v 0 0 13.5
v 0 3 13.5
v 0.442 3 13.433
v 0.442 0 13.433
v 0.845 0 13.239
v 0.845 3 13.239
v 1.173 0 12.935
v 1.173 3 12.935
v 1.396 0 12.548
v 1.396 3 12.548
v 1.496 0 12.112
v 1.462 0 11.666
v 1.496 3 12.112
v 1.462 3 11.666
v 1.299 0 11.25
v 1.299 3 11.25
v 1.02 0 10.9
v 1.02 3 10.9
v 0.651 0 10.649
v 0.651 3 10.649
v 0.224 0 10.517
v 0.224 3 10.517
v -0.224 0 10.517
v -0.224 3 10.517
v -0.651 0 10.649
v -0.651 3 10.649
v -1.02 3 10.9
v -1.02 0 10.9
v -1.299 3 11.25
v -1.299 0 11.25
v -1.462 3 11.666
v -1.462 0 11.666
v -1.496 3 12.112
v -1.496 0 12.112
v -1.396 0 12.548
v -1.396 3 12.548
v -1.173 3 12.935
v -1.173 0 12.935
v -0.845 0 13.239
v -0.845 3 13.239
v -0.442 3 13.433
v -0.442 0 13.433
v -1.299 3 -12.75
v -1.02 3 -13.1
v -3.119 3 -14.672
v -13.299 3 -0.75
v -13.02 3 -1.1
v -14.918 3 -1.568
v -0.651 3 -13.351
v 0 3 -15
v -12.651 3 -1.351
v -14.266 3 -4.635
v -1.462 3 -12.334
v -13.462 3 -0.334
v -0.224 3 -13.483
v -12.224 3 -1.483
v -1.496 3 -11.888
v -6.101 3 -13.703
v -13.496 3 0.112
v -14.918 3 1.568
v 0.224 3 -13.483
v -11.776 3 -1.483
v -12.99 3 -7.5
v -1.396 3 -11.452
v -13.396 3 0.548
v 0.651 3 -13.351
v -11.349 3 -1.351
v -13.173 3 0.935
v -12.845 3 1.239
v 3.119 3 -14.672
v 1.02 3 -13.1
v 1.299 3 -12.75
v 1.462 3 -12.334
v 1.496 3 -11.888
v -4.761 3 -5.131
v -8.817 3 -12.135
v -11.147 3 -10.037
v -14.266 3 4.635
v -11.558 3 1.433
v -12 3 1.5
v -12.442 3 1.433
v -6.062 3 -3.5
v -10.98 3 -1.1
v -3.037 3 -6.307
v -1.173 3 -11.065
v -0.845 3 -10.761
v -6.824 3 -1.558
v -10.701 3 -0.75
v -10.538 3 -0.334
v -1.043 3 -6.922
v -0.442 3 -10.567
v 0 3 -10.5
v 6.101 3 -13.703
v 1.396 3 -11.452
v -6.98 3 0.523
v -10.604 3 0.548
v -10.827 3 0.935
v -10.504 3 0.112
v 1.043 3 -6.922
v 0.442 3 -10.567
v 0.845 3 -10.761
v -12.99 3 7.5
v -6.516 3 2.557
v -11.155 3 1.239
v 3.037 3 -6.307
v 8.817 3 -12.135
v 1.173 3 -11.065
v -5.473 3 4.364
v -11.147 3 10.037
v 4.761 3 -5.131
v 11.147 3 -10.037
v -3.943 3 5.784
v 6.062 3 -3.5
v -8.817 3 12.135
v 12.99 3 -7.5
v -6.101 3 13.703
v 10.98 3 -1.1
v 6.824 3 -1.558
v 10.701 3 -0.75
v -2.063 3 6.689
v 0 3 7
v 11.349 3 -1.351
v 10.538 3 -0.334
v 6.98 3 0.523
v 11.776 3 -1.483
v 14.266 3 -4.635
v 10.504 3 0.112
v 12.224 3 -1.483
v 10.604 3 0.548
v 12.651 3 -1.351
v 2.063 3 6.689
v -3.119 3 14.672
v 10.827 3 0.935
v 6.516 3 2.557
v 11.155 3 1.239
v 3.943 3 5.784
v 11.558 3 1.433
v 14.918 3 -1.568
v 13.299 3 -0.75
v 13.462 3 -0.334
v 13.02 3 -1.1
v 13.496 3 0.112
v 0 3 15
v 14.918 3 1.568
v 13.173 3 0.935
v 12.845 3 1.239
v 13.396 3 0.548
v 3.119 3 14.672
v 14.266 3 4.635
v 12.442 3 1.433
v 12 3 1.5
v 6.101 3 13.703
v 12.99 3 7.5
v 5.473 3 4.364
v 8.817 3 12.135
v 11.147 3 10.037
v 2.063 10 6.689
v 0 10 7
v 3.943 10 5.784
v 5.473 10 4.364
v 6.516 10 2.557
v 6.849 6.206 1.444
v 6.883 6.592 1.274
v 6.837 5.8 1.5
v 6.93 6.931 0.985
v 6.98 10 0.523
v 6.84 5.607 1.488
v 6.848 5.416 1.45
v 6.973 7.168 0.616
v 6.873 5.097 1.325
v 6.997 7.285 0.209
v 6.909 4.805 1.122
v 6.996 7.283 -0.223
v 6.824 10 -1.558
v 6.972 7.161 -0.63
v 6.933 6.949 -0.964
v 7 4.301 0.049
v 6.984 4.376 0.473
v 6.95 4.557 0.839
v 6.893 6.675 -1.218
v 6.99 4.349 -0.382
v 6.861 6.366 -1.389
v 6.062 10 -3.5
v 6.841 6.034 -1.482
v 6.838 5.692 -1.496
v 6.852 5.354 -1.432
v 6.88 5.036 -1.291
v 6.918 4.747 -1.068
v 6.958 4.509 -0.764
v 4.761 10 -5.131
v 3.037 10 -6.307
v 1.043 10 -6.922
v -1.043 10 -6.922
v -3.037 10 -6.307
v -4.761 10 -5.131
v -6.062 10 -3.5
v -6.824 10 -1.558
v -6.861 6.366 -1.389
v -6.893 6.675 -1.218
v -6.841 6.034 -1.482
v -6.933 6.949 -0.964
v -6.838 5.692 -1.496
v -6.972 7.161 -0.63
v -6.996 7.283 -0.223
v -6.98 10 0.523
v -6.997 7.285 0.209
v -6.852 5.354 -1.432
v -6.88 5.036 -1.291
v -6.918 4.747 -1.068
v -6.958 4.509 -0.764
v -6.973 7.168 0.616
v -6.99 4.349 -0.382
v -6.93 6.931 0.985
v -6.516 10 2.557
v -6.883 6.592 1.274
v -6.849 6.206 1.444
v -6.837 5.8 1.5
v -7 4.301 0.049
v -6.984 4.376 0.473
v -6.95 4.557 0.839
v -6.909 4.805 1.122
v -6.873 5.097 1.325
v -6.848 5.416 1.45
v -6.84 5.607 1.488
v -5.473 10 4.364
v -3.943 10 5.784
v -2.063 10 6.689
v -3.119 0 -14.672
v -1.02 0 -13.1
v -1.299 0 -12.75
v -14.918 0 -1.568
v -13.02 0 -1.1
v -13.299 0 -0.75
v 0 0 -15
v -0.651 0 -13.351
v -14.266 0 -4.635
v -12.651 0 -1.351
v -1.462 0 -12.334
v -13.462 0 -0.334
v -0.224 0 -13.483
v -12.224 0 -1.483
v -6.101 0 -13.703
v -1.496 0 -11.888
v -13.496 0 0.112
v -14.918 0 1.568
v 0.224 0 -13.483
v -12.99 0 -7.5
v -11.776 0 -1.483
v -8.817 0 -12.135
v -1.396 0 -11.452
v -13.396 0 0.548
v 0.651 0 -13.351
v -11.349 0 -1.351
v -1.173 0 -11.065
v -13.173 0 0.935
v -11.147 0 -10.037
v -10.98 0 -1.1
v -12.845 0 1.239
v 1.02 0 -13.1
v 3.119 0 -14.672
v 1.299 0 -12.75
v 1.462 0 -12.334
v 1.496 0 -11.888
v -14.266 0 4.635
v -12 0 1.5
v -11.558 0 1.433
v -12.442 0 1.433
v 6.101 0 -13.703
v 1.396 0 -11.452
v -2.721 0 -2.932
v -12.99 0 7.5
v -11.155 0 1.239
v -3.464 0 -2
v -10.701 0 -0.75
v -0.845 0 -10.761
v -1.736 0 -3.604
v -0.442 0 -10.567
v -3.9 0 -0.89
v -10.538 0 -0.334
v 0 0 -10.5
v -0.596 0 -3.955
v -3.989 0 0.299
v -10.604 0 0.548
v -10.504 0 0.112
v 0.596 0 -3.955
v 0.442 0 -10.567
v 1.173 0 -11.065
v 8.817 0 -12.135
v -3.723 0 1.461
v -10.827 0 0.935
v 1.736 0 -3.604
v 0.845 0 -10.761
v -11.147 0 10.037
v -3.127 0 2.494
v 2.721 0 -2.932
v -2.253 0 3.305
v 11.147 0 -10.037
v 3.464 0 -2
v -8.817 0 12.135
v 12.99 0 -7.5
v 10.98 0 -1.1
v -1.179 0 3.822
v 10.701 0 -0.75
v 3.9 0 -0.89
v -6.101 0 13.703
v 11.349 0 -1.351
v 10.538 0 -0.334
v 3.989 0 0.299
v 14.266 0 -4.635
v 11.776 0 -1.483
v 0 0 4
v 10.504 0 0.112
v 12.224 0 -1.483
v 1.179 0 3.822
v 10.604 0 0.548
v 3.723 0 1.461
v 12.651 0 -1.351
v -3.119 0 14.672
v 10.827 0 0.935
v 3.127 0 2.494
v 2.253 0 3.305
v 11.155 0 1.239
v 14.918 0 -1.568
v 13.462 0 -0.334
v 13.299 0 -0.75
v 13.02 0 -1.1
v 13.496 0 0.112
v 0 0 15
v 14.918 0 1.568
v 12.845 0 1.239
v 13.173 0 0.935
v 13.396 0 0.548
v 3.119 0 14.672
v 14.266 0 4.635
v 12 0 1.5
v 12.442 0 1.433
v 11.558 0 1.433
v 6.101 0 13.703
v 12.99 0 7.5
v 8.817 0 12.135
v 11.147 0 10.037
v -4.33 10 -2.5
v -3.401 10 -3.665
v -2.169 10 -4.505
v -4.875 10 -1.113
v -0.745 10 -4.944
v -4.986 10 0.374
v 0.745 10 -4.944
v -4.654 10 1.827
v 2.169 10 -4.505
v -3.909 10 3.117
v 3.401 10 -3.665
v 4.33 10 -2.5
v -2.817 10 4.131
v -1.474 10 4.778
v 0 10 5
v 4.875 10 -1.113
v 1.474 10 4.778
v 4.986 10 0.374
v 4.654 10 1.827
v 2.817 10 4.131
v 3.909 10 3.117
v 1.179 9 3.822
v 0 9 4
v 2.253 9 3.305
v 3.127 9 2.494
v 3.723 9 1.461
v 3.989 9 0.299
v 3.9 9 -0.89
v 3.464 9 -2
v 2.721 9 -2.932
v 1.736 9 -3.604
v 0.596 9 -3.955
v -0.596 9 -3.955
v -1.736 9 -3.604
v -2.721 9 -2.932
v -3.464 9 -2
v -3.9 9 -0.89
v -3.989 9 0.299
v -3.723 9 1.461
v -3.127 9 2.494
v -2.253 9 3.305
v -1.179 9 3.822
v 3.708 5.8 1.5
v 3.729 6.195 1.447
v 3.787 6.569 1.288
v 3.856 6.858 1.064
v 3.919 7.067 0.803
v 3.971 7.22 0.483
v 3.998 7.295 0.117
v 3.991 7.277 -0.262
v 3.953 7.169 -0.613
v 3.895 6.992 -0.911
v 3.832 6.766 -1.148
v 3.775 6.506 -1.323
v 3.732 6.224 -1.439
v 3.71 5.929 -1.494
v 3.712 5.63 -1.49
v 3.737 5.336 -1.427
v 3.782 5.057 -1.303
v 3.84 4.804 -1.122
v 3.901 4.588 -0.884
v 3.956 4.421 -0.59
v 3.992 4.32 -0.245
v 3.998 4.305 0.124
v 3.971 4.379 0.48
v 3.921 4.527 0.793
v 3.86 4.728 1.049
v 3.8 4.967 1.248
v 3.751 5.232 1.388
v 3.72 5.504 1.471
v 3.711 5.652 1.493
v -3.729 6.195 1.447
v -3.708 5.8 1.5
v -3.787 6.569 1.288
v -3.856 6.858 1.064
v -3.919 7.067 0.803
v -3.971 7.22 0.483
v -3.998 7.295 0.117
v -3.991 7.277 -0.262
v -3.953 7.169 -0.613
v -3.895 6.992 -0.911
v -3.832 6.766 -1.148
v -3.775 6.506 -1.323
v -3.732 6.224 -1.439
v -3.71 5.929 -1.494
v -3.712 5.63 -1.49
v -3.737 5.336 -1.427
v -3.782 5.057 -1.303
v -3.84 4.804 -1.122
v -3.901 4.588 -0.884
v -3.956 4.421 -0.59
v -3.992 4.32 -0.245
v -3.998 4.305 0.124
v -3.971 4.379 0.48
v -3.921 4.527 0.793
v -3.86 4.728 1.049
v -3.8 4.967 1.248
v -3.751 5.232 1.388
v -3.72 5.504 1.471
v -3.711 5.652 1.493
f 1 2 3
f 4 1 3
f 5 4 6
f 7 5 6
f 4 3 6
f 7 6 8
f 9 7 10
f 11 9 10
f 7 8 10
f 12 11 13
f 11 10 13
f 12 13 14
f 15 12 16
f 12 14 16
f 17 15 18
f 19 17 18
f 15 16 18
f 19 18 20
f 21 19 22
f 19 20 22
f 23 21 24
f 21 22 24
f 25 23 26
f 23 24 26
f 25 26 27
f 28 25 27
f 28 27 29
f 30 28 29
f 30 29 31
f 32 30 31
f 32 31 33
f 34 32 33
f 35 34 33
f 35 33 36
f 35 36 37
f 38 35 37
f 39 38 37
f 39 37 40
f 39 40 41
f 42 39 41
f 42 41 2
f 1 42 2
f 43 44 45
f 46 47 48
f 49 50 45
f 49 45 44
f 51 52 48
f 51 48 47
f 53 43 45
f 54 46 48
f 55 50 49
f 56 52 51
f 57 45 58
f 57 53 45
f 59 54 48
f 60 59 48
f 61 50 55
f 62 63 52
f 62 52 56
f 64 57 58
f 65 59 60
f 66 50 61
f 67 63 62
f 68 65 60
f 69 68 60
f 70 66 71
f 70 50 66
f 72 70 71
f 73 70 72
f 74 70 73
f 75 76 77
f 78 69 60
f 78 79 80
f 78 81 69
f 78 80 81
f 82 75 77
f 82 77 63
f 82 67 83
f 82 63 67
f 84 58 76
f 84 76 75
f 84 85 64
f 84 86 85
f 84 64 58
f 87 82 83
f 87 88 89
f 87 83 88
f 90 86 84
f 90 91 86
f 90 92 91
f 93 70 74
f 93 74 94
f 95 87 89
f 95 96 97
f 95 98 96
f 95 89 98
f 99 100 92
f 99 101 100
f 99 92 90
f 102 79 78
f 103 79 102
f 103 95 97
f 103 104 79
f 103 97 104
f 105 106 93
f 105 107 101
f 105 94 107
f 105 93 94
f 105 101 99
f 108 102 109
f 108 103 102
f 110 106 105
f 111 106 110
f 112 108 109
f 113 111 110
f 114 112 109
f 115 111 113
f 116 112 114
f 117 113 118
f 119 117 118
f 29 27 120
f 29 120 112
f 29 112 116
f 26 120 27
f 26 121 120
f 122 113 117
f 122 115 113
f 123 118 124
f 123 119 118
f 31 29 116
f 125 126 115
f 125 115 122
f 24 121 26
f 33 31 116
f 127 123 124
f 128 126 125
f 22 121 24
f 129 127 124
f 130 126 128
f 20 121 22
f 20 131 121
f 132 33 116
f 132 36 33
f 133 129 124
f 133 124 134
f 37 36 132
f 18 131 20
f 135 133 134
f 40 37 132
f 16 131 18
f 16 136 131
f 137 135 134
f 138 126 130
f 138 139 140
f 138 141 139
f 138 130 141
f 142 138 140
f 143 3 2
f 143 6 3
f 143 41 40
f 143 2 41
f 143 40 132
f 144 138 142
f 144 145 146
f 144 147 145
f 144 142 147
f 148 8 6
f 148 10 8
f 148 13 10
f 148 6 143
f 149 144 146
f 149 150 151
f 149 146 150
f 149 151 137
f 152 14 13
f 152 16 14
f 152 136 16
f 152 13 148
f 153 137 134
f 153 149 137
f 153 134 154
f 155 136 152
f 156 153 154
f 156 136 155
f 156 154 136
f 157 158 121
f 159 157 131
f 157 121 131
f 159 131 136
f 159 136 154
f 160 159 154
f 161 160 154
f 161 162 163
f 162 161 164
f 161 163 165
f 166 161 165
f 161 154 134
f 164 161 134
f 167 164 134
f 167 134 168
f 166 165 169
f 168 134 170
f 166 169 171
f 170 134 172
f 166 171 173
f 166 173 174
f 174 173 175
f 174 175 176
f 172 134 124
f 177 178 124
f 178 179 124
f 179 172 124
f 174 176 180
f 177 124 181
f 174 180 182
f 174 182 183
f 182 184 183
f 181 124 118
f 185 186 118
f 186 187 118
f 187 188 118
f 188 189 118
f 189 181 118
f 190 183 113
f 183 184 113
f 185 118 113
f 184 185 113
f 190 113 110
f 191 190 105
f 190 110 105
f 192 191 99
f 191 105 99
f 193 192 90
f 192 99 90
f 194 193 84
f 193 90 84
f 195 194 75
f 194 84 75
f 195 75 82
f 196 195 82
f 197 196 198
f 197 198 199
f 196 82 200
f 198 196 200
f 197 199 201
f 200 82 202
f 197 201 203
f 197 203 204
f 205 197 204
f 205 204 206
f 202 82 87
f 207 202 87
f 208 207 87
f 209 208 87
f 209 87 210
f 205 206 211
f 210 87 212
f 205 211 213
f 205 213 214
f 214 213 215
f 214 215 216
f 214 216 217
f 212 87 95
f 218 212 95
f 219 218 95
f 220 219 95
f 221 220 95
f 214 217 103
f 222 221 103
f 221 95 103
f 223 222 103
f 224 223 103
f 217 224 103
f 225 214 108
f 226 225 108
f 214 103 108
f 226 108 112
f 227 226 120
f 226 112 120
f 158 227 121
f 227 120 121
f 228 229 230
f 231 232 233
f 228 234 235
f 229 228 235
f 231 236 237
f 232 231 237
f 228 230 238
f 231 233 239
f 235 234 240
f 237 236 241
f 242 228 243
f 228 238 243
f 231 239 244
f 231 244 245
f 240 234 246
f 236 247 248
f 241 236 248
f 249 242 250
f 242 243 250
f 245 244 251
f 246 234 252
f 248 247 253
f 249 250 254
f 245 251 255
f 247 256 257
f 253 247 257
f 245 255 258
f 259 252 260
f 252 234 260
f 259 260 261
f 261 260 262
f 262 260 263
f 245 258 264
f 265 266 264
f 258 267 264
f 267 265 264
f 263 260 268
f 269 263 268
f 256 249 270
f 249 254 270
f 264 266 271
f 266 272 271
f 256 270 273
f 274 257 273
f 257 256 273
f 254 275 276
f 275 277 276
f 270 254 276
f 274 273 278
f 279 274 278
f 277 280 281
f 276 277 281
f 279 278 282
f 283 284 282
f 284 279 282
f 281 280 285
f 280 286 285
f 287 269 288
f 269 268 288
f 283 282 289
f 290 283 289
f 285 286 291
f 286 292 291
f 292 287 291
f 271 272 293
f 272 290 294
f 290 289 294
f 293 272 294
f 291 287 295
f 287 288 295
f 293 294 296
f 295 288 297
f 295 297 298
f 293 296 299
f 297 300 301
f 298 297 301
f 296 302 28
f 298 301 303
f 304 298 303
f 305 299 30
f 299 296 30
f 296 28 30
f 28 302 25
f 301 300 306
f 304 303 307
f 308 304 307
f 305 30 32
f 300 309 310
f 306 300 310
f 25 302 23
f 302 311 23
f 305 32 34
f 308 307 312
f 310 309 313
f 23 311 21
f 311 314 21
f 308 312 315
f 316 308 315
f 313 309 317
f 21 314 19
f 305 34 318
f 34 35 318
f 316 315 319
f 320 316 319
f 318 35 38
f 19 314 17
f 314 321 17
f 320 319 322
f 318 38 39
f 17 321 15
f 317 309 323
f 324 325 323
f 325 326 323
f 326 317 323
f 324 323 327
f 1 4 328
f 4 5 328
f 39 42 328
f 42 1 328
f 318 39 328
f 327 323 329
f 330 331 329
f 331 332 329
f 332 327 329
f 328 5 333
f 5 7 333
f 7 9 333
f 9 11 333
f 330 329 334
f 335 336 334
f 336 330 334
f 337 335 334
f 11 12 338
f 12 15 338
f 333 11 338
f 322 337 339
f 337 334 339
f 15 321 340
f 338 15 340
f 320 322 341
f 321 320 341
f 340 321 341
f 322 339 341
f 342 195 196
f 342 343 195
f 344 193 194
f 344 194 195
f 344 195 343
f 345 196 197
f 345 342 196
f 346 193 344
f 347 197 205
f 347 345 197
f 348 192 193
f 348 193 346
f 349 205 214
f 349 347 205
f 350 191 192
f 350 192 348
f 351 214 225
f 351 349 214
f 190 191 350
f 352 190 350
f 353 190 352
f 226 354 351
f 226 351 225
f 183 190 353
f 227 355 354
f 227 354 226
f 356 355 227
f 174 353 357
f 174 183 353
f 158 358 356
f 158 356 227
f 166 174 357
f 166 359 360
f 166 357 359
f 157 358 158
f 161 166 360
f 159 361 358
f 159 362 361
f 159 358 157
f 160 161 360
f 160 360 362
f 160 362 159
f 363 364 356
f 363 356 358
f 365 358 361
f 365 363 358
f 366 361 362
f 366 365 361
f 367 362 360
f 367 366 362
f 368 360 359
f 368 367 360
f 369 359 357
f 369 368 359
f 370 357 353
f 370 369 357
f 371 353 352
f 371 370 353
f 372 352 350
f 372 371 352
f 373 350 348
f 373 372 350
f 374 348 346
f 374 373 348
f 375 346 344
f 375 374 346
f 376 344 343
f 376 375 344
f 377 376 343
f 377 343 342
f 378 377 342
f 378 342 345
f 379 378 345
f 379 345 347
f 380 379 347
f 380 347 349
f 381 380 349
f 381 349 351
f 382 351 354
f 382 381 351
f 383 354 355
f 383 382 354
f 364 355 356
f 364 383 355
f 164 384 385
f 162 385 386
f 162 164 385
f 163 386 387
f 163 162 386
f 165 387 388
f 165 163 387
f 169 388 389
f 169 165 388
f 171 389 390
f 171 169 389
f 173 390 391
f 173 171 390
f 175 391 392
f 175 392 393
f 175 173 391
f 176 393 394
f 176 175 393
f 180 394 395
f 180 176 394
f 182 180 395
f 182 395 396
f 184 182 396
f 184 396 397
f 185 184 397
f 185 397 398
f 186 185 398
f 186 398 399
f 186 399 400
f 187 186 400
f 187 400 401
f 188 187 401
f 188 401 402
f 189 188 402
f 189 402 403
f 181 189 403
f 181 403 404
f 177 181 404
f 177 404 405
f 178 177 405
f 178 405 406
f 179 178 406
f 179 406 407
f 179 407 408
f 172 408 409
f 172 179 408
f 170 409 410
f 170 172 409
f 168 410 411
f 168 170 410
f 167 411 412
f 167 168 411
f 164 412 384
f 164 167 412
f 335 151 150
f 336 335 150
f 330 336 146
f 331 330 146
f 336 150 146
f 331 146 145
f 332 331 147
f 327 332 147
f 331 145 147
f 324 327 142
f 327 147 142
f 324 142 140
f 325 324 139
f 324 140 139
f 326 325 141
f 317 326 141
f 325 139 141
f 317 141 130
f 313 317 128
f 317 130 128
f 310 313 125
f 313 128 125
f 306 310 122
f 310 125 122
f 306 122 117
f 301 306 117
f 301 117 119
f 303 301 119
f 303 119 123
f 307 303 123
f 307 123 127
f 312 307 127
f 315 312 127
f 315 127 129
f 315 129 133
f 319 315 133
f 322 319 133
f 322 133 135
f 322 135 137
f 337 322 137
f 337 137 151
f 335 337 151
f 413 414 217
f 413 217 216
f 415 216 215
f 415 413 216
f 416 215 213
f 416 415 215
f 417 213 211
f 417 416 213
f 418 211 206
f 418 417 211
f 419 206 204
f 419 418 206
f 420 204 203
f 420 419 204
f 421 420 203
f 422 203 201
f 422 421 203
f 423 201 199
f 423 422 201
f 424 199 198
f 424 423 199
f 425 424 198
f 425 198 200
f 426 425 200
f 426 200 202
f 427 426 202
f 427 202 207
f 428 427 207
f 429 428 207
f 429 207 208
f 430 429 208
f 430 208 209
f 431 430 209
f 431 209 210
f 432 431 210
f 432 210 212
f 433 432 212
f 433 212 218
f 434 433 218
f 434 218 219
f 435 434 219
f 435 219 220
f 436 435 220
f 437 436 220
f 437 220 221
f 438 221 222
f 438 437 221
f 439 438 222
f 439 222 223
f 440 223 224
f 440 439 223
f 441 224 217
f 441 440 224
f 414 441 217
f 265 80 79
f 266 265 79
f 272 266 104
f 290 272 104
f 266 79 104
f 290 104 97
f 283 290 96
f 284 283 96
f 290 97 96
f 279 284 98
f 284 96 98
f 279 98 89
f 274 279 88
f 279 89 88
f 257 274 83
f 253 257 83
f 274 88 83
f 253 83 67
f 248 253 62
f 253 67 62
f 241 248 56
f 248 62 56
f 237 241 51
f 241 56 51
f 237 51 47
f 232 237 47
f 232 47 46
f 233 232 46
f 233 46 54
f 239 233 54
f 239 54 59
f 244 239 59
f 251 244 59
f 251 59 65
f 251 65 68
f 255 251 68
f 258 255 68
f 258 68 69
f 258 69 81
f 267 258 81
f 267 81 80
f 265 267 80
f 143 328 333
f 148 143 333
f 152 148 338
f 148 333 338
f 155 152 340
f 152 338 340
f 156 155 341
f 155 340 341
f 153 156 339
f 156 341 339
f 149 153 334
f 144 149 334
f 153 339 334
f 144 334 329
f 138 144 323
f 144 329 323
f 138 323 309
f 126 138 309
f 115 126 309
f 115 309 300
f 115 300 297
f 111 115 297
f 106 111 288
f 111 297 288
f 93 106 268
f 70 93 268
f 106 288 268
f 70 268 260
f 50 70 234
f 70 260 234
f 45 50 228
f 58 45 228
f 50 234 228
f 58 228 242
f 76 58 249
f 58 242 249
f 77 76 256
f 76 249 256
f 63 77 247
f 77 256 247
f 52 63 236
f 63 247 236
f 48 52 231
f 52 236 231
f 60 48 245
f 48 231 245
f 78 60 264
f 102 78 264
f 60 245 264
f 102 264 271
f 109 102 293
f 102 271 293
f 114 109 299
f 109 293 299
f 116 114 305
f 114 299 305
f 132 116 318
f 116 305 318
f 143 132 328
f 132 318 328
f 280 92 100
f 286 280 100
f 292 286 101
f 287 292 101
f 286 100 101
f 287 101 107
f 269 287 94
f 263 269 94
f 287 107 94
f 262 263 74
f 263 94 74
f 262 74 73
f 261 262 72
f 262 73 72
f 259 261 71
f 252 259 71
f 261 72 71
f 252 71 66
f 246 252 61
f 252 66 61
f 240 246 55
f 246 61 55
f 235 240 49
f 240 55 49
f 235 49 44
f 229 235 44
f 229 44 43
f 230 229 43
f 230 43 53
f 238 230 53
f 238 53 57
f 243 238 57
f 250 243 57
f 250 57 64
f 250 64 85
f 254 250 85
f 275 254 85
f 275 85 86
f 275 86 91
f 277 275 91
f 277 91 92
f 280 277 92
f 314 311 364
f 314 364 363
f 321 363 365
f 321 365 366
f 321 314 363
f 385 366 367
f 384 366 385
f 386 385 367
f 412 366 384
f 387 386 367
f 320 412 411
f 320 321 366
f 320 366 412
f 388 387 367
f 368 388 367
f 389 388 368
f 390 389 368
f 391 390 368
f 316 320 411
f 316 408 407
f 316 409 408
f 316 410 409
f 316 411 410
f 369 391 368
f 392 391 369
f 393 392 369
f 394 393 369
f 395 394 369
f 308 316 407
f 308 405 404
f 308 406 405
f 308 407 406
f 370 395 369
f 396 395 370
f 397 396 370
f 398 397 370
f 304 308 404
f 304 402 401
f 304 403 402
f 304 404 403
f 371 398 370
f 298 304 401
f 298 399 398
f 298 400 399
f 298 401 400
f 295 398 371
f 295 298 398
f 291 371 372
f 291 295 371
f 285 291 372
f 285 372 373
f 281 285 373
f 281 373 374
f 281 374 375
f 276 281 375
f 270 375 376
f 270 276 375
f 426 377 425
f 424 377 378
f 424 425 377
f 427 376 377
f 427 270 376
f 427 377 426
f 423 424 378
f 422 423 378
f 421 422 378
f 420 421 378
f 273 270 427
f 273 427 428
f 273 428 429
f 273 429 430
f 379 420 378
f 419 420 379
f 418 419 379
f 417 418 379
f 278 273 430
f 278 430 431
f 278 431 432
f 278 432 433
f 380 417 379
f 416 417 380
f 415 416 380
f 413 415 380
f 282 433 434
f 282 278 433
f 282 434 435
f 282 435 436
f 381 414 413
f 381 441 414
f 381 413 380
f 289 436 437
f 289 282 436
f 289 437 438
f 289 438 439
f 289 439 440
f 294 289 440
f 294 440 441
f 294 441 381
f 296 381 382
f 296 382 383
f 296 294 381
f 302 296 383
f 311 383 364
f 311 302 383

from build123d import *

# Parameters (mm, degrees)
SKETCH_1_R               = 15
SKETCH_1_R_2             = 4
EXTRUDE_1_DEPTH          = 3
SKETCH_2_R               = 7
SKETCH_2_R_2             = 4
EXTRUDE_2_DEPTH          = 7
CUT_EXTRUDE_1_DEPTH      = 13
CUT_EXTRUDE_1_DEPTH_BACK = 12
SKETCH_5_R               = 1.5
SKETCH_7_R               = 1.5
CUT_EXTRUDE_3_DEPTH      = 4
CHAMFER_1_SIZE           = 1


with BuildPart() as part:
    # 草图1 → 凸台-拉伸1 (new body)
    with BuildSketch(Plane(origin=(0, 0, 0), x_dir=(1, 0, 0), z_dir=(0, 1, 0))):
        Circle(SKETCH_1_R)
        Circle(SKETCH_1_R_2, mode=Mode.SUBTRACT)
    extrude(amount=EXTRUDE_1_DEPTH)

    # 草图2 → 凸台-拉伸2 (add)
    with BuildSketch(Plane(origin=(0, 3, 0), x_dir=(1, 0, 0), z_dir=(0, 1, 0))):
        Circle(SKETCH_2_R)
        Circle(SKETCH_2_R_2, mode=Mode.SUBTRACT)
    extrude(amount=EXTRUDE_2_DEPTH)

    # 草图5 → 切除-拉伸1 (cut, two sides: drawn at the far end of the back side and taken through both)
    with BuildSketch(Plane.ZY.offset(-CUT_EXTRUDE_1_DEPTH_BACK)):
        with Locations((0, 5.8)):
            Circle(SKETCH_5_R)
    extrude(amount=CUT_EXTRUDE_1_DEPTH + CUT_EXTRUDE_1_DEPTH_BACK, mode=Mode.SUBTRACT)

    # 草图7 → 切除-拉伸3 (cut)
    with BuildSketch(Plane(origin=(0, 3, 0), x_dir=(1, 0, 0), z_dir=(0, 1, 0))):
        with Locations((0, -12)):
            Circle(SKETCH_7_R)
        with Locations((-12, 0)):
            Circle(SKETCH_7_R)
        with Locations((0, 12)):
            Circle(SKETCH_7_R)
        with Locations((12, 0)):
            Circle(SKETCH_7_R)
    extrude(amount=-CUT_EXTRUDE_3_DEPTH, mode=Mode.SUBTRACT)

    # 倒角1
    chamfer_1_edges = [part.edges().sort_by_distance(p)[0] for p in [
        (-4, 10, 0),
    ]]
    chamfer(chamfer_1_edges, length=CHAMFER_1_SIZE)


solid = part.part
